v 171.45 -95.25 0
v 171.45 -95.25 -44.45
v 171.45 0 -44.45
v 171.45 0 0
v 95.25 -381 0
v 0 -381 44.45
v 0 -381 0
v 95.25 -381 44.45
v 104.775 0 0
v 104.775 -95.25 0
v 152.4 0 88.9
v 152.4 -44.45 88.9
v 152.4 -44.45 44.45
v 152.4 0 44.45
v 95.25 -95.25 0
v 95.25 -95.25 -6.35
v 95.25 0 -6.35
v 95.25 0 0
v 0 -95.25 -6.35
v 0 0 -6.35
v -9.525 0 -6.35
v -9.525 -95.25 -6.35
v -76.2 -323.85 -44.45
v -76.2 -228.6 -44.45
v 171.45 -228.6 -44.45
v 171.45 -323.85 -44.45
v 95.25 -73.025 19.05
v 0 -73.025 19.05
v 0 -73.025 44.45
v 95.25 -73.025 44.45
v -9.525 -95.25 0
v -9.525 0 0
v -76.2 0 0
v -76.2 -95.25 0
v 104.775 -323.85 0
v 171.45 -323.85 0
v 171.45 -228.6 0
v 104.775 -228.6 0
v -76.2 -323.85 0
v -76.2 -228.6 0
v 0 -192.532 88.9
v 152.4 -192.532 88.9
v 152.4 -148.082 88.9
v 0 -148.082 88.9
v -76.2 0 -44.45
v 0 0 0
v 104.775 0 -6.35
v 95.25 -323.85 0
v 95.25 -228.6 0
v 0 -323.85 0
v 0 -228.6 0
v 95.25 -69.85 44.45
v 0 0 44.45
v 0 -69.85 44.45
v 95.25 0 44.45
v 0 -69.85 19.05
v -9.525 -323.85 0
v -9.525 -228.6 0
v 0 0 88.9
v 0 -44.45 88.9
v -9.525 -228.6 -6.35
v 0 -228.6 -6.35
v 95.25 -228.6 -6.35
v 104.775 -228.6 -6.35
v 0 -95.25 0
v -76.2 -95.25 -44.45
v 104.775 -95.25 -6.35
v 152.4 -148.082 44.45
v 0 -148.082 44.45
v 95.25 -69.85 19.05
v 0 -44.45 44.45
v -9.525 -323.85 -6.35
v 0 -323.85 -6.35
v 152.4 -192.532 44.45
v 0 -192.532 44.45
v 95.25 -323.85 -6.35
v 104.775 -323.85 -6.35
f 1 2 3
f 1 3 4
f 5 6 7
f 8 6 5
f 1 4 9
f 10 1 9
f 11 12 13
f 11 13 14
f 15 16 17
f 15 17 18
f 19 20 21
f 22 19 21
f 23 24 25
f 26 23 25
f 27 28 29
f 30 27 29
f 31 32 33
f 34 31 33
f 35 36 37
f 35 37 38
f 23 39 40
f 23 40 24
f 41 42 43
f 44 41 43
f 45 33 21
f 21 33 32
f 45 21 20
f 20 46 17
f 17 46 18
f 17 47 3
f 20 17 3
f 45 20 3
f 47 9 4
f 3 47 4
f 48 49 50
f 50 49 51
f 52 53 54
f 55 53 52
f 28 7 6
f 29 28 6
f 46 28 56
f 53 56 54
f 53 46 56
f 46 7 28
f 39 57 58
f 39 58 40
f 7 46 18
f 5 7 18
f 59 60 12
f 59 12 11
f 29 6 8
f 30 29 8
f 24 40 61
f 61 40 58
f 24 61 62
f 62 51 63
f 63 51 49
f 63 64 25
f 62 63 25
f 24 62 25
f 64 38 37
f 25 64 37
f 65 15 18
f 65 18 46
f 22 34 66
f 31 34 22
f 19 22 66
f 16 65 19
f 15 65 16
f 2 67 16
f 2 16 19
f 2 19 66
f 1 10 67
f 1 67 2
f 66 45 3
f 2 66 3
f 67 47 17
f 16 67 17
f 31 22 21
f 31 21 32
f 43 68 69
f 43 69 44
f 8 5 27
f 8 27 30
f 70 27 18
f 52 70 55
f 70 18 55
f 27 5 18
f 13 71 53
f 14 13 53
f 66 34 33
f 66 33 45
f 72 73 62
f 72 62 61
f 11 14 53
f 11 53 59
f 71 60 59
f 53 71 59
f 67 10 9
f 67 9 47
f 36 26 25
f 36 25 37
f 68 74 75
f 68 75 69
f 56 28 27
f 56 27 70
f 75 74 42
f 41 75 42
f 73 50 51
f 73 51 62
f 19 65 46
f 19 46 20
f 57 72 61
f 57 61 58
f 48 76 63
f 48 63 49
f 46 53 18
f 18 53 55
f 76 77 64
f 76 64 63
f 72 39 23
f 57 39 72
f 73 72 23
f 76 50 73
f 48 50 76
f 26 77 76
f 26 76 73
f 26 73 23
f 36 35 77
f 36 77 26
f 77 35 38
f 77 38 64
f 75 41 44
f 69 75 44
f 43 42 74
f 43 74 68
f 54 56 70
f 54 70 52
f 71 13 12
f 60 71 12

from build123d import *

# Parameters (mm, degrees)
F0_W      = 95.25
F0_H      = 44.45
F1_DEPTH  = 381
F3_DEPTH  = 95.25
F6_DEPTH  = 95.25
F7_W      = 44.45
F7_H      = 44.45
F8_DEPTH  = 152.4
F9_W      = 3.175
F9_H      = 25.4
F10_DEPTH = 171.451


with BuildPart() as f1:
    # F0 (on Front) → F1 (new body)
    with BuildSketch(Plane.XZ):
        with Locations((47.625, 22.225)):
            Rectangle(F0_W, F0_H)
    extrude(amount=F1_DEPTH)

    # F9 (on Right) → F10 (cut, through all)
    with BuildSketch(Plane.YZ):
        with Locations((-71.4375, 31.75)):
            Rectangle(F9_W, F9_H)
    extrude(amount=F10_DEPTH, mode=Mode.SUBTRACT)


with BuildPart() as f3:
    # F2 (on Front) → F3 (new body)
    with BuildSketch(Plane.XZ):
        Polygon((-9.525, -6.35), (-9.525, 0), (-76.2, 0), (-76.2, -44.45), (171.45, -44.45), (171.45, 0), (104.775, 0), (104.775, -6.35), (95.25, -6.35), (95.25, 0), (0, 0), (0, -6.35), align=None)
    extrude(amount=F3_DEPTH)


with BuildPart() as f6:
    # F5 (on offset) → F6 (new body)
    with BuildSketch(Plane.XZ.offset(228.6)):
        Polygon((-9.525, -6.35), (-9.525, 0), (-76.2, 0), (-76.2, -44.45), (171.45, -44.45), (171.45, 0), (104.775, 0), (104.775, -6.35), (95.25, -6.35), (95.25, 0), (0, 0), (0, -6.35), align=None)
    extrude(amount=F6_DEPTH)


with BuildPart() as f8:
    # F7 (on Right) → F8 (new body)
    with BuildSketch(Plane.YZ):
        with Locations((-170.307, 66.675)):
            Rectangle(F7_W, F7_H)
        with Locations((-22.225, 66.675)):
            Rectangle(F7_W, F7_H)
    extrude(amount=F8_DEPTH)


solid = Compound([f1.part, f3.part, f6.part, f8.part])
